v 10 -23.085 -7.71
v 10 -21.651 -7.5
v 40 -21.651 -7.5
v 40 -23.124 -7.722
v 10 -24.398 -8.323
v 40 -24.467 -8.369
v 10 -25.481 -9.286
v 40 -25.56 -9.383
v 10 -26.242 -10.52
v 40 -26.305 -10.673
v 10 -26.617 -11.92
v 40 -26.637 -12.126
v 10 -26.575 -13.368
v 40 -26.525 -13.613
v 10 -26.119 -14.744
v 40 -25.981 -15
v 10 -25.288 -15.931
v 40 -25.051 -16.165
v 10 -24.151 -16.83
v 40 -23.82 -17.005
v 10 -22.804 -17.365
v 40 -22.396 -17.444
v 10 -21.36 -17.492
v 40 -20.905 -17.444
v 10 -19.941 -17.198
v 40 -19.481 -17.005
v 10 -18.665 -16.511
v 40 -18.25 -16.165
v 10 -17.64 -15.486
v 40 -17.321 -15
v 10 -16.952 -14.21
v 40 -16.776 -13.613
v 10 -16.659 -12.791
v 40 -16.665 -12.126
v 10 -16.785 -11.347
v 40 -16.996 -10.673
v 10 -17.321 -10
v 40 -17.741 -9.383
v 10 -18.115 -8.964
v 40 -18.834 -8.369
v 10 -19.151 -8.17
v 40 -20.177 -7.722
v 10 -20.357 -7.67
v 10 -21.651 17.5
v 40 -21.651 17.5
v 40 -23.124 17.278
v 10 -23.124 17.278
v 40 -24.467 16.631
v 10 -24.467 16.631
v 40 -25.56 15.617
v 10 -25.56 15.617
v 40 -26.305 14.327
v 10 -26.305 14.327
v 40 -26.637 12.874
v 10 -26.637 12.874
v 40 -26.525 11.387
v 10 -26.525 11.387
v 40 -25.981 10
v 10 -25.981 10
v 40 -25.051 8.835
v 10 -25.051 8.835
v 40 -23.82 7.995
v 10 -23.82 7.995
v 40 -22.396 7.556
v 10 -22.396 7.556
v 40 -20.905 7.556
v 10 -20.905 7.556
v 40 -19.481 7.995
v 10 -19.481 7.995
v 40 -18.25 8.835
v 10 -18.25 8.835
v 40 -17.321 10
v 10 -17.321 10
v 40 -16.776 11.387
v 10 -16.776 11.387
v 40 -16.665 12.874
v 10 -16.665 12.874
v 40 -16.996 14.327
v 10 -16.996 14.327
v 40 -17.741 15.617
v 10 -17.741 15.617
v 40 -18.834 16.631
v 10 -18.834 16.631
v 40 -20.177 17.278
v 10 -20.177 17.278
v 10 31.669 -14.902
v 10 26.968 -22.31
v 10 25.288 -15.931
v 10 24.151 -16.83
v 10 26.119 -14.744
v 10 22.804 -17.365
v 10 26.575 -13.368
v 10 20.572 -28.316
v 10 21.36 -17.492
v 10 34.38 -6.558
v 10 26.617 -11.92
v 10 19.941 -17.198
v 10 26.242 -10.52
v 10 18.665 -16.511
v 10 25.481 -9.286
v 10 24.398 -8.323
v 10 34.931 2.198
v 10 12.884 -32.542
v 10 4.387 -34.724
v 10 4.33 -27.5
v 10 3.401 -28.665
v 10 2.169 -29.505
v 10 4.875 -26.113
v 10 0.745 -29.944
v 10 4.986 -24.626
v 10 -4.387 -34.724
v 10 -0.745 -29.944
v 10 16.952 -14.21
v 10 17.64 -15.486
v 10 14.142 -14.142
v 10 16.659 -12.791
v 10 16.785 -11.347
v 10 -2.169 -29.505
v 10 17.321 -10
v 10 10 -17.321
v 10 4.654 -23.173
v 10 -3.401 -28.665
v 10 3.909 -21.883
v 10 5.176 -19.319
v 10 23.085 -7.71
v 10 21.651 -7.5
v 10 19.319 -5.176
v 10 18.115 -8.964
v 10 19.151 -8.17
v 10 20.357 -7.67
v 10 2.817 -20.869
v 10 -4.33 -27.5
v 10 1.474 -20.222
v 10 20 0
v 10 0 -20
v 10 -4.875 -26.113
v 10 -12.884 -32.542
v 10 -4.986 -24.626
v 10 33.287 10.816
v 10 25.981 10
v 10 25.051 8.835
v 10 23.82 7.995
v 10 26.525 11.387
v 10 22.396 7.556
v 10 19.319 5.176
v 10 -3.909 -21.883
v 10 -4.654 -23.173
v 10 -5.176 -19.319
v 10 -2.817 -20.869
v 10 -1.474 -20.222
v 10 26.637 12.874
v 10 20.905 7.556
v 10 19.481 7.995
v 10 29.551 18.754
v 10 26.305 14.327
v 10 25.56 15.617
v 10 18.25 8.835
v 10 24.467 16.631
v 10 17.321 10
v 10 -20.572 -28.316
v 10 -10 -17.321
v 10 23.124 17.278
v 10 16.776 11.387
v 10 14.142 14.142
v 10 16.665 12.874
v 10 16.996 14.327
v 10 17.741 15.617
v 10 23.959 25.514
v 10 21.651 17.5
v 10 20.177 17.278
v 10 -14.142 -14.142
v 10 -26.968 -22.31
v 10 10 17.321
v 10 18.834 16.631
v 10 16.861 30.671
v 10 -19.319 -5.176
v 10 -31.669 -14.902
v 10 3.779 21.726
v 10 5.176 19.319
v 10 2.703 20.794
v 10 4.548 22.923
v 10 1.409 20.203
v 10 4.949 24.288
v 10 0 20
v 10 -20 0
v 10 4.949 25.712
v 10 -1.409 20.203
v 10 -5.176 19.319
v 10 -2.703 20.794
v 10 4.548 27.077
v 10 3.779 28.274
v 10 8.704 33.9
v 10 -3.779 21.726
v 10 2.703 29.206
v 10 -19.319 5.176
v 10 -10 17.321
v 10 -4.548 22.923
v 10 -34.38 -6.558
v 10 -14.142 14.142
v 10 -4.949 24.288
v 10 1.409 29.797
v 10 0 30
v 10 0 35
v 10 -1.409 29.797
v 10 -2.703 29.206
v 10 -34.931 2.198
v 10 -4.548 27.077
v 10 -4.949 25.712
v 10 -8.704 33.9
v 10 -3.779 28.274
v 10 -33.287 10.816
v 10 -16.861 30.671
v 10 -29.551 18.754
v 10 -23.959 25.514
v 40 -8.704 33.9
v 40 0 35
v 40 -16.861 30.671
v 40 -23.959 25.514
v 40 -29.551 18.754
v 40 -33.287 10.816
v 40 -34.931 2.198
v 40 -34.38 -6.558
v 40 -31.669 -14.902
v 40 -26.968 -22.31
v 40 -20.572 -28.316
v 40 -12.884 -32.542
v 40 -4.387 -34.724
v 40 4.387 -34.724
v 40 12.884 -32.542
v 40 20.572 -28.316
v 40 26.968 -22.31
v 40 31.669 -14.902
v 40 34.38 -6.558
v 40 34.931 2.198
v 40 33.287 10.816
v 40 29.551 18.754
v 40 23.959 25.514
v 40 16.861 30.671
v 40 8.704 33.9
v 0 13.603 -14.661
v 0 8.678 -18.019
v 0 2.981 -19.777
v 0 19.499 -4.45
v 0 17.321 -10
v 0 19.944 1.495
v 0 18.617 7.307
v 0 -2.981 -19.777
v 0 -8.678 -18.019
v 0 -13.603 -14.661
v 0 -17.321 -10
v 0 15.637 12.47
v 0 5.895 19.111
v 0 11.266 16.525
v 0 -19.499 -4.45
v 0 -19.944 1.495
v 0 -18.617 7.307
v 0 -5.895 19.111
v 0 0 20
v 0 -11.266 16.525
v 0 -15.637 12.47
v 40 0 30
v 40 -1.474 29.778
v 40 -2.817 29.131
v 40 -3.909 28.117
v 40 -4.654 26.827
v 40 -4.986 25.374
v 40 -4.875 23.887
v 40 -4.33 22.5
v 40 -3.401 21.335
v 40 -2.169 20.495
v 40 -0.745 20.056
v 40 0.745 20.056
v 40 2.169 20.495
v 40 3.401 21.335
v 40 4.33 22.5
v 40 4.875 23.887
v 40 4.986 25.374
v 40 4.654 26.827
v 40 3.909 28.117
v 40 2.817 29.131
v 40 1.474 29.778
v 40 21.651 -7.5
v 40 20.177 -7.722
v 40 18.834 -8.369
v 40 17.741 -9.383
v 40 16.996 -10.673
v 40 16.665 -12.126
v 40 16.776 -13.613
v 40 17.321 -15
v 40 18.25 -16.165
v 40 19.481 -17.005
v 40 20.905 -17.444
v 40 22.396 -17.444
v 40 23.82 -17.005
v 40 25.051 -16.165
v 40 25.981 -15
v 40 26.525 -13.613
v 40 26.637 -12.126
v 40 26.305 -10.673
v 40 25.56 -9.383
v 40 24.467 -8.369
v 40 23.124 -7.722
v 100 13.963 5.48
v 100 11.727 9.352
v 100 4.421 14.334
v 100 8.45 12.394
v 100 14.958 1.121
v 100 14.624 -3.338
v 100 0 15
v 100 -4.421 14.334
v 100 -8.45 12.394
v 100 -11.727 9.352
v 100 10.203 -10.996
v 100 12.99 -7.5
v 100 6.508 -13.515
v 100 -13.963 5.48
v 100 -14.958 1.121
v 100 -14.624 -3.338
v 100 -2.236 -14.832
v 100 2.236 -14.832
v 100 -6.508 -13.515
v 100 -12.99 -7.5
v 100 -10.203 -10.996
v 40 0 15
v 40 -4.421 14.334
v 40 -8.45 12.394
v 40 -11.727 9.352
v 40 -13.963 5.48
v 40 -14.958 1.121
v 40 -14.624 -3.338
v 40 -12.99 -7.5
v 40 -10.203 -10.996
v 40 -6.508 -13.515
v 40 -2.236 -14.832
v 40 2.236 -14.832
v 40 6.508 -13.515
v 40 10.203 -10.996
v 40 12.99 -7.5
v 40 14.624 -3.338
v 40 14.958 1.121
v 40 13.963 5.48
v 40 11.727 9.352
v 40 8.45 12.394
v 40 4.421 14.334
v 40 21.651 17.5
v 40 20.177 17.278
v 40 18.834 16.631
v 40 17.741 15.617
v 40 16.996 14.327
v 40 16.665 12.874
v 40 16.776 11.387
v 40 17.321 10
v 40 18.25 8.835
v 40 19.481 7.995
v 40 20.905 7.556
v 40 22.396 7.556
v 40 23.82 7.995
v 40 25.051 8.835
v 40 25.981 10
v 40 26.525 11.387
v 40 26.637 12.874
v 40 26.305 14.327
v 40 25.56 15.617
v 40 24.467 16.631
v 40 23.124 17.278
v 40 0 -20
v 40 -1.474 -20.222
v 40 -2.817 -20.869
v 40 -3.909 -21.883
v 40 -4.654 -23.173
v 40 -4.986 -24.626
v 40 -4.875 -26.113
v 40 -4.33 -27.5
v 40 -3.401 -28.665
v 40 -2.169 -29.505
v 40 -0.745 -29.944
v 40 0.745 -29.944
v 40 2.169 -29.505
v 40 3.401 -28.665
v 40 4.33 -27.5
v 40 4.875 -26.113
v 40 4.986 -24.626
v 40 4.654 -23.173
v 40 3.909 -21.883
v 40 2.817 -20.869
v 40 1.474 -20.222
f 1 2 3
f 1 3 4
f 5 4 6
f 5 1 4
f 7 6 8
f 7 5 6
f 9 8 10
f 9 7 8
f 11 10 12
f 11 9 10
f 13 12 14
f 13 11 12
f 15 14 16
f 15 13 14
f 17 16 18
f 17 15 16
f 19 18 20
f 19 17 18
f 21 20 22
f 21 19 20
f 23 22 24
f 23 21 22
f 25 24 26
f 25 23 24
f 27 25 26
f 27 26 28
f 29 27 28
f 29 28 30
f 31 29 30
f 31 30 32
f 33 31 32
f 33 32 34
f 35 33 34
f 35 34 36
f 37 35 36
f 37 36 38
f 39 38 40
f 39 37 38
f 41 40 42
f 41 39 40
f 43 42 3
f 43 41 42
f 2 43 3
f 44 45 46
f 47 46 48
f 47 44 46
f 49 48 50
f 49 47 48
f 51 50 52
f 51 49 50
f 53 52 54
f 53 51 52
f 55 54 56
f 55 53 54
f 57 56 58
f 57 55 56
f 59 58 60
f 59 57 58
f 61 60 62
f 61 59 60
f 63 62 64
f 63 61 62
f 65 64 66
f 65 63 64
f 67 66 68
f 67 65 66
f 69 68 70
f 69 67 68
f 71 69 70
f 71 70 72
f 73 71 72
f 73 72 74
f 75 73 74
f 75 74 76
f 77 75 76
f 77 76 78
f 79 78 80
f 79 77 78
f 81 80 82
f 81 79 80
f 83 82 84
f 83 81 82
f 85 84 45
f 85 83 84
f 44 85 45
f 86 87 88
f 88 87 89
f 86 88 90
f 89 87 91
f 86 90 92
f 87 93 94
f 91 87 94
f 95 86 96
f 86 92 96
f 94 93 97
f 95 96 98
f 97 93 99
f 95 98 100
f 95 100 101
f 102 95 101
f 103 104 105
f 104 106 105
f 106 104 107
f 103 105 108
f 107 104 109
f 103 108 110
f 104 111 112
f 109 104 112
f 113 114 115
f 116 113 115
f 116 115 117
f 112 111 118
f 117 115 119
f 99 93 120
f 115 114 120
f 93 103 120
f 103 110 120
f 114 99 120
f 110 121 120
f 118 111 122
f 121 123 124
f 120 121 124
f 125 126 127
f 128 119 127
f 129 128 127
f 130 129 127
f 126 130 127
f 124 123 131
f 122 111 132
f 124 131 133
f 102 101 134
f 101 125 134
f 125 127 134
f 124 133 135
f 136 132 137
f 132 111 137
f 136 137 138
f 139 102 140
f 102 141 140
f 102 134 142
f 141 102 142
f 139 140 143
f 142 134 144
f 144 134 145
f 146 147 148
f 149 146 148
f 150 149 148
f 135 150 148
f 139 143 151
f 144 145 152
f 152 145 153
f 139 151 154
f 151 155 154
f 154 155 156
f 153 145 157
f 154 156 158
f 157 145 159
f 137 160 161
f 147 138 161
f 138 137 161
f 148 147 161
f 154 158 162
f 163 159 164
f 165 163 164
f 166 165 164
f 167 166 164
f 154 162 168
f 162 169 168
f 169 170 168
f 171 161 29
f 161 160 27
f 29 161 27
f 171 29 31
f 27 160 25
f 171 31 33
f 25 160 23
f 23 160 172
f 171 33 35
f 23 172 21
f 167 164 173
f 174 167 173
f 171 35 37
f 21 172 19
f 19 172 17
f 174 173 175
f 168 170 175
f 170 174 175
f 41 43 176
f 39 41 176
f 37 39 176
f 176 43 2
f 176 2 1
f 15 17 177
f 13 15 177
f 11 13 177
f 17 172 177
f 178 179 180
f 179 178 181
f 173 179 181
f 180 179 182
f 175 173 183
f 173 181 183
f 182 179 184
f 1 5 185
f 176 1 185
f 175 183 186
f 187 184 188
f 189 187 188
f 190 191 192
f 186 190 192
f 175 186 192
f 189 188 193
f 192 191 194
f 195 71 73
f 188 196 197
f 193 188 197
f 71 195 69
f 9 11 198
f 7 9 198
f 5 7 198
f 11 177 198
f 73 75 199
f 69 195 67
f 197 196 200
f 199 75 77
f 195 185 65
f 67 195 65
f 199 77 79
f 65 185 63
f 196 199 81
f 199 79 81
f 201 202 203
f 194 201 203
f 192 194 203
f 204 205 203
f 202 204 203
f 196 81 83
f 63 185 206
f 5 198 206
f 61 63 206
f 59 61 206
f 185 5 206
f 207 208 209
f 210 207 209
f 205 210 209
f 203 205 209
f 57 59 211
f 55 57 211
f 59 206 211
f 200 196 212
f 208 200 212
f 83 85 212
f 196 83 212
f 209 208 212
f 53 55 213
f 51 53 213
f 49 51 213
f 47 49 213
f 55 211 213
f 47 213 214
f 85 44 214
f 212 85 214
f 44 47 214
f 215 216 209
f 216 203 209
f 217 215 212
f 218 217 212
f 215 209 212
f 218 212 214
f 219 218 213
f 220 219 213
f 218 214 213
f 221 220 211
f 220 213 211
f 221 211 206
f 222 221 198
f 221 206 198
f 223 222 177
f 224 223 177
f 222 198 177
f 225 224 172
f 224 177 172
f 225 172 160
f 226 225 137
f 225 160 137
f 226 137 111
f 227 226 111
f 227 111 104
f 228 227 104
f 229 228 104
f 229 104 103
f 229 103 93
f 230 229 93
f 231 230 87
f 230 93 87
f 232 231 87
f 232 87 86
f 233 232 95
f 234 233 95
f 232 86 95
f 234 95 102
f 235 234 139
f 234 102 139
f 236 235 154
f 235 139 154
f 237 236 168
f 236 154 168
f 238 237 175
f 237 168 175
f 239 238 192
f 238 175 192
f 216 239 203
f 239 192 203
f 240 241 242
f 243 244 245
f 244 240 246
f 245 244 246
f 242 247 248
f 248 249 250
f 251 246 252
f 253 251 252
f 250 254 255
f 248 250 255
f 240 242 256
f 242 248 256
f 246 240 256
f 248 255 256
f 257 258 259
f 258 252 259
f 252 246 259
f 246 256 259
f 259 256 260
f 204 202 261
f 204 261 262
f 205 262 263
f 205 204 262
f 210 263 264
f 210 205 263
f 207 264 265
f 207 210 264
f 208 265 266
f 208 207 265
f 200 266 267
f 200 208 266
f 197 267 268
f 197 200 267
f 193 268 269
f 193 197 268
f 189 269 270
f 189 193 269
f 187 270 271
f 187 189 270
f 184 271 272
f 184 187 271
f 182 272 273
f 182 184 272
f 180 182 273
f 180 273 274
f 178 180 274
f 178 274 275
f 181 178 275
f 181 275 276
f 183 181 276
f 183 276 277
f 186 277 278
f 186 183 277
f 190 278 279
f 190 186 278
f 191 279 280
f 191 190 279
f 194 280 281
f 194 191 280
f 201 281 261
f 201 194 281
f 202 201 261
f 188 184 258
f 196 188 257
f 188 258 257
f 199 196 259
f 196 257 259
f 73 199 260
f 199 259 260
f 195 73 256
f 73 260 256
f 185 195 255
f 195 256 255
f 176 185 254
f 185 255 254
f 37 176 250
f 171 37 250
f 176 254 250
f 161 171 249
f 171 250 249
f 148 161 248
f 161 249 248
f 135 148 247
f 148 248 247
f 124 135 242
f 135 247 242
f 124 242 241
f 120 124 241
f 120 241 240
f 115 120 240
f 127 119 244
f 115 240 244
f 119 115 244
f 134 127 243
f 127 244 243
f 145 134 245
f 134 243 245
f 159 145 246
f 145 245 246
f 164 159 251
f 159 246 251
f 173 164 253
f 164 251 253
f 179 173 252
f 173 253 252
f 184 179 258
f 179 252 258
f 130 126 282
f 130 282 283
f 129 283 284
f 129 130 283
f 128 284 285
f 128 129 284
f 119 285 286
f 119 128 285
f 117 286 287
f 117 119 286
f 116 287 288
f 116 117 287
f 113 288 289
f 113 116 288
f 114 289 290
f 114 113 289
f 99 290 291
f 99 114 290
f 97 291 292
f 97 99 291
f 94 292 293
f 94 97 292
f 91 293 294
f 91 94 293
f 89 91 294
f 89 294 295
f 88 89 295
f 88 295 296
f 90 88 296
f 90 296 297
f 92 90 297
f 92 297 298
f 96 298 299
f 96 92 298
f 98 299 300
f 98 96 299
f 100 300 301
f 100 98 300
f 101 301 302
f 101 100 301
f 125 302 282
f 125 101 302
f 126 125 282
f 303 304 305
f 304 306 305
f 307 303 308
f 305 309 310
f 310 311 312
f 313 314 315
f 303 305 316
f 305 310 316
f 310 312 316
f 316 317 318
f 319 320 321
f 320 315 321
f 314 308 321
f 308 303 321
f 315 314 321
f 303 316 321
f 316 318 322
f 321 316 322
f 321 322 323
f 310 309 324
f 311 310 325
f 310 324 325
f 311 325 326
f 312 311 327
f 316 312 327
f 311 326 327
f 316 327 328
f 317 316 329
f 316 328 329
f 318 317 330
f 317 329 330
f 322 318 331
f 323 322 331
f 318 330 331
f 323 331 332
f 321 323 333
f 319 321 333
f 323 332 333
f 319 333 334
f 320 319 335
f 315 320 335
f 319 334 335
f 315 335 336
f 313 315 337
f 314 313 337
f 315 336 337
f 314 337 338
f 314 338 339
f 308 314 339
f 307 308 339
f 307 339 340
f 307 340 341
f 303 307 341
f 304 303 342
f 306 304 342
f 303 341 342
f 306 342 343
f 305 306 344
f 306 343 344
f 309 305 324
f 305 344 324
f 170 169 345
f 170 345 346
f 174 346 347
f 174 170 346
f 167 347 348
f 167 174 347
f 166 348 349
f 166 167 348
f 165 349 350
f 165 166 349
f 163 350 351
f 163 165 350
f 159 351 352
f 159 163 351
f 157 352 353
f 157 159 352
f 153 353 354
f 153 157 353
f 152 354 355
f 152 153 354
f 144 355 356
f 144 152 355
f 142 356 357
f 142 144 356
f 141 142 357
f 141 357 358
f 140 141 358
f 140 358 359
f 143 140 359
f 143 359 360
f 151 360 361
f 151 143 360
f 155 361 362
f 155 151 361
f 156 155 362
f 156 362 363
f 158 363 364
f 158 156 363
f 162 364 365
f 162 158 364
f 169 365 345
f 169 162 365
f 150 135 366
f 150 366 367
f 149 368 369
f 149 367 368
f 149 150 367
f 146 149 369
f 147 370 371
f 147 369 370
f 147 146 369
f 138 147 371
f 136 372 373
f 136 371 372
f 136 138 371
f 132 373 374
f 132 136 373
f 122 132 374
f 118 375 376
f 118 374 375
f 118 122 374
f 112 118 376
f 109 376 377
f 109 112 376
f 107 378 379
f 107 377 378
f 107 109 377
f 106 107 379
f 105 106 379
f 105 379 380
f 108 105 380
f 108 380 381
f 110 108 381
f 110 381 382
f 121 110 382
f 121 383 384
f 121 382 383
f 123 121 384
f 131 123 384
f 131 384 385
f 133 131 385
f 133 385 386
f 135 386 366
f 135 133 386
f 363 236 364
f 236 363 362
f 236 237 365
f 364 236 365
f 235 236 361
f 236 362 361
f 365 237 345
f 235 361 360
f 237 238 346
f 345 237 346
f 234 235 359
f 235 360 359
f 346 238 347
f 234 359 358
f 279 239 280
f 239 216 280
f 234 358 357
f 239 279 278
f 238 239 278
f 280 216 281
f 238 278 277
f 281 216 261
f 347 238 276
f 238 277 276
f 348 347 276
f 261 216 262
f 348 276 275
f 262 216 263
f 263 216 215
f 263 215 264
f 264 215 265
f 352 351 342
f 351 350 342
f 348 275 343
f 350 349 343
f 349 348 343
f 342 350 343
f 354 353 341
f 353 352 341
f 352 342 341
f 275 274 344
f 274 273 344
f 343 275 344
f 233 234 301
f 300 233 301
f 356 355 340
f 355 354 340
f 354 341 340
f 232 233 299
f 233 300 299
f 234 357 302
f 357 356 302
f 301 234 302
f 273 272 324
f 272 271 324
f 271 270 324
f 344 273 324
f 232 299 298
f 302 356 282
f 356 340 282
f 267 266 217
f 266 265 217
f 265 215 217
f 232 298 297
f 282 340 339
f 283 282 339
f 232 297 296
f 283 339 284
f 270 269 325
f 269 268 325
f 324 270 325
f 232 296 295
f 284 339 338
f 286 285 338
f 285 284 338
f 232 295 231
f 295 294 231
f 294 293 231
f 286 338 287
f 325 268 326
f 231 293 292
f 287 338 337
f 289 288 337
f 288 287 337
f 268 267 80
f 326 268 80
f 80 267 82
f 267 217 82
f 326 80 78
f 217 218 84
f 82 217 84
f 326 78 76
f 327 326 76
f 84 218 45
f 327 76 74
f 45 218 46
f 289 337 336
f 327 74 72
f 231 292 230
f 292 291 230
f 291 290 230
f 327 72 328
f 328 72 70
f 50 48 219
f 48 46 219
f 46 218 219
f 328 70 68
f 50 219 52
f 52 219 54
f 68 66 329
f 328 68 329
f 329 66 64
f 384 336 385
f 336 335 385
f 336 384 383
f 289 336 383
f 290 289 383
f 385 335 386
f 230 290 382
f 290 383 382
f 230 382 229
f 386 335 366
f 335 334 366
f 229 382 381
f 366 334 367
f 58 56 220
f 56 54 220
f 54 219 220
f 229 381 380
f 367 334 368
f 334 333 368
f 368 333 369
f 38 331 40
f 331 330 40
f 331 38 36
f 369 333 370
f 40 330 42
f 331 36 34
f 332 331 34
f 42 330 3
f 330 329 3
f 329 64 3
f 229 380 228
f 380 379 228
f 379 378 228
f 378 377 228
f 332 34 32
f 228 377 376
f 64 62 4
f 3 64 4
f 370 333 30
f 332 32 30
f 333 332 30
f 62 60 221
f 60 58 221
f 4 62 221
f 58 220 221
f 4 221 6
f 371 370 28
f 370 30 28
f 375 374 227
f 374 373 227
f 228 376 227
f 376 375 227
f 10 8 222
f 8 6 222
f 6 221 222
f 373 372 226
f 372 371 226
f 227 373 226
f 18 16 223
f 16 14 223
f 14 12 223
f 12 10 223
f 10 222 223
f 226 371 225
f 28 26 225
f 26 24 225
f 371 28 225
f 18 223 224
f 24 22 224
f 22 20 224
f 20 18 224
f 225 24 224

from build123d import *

# Parameters (mm, degrees)
SKETCH_2_R          = 5
CUT_EXTRUDE_1_DEPTH = 112.579568022
SKETCH_3_R          = 5
CUT_EXTRUDE_2_DEPTH = 112.579568022
SKETCH_4_R          = 5
CUT_EXTRUDE_3_DEPTH = 112.579568022
SKETCH_5_R          = 5
CUT_EXTRUDE_4_DEPTH = 112.579568022
SKETCH_6_R          = 5
CUT_EXTRUDE_5_DEPTH = 112.579568022
SKETCH_7_R          = 5
CUT_EXTRUDE_6_DEPTH = 112.579568022


with BuildPart() as part:
    # Эскиз1 → Повернуть1 (revolve)
    with BuildSketch(Plane.XY, mode=Mode.PRIVATE) as revolve_1_sk:
        Polygon((0, 0), (100, 0), (100, 15), (40, 15), (40, 35), (10, 35), (10, 20), (0, 20), align=None)
    revolve(revolve_1_sk.sketch.rotate(Axis((0, 0, 0), (1, 0, 0)), 90), axis=Axis((0, 0, 0), (1, 0, 0)))

    # Эскиз2 → Вырез-Вытянуть1 (cut, through all)
    with BuildSketch(Plane(origin=(0, 0, 0), x_dir=(0, 0, -1), z_dir=(1, 0, 0))):
        with Locations(Location((25, 0, 0), (0, 0, 180))):
            Circle(SKETCH_2_R)
    extrude(amount=CUT_EXTRUDE_1_DEPTH, mode=Mode.SUBTRACT)

    # Эскиз3 → Вырез-Вытянуть2 (cut, through all)
    with BuildSketch(Plane(origin=(0, 0, 0), x_dir=(0, 0, -1), z_dir=(1, 0, 0))):
        with Locations(Location((12.5, 21.650635095, 0), (0, 0, 180))):
            Circle(SKETCH_3_R)
    extrude(amount=CUT_EXTRUDE_2_DEPTH, mode=Mode.SUBTRACT)

    # Эскиз4 → Вырез-Вытянуть3 (cut, through all)
    with BuildSketch(Plane(origin=(0, 0, 0), x_dir=(0, 0, -1), z_dir=(1, 0, 0))):
        with Locations(Location((-12.5, 21.650635095, 0), (0, 0, 180))):
            Circle(SKETCH_4_R)
    extrude(amount=CUT_EXTRUDE_3_DEPTH, mode=Mode.SUBTRACT)

    # Эскиз5 → Вырез-Вытянуть4 (cut, through all)
    with BuildSketch(Plane(origin=(0, 0, 0), x_dir=(0, 0, -1), z_dir=(1, 0, 0))):
        with Locations(Location((-25, 0, 0), (0, 0, 180))):
            Circle(SKETCH_5_R)
    extrude(amount=CUT_EXTRUDE_4_DEPTH, mode=Mode.SUBTRACT)

    # Эскиз6 → Вырез-Вытянуть5 (cut, through all)
    with BuildSketch(Plane(origin=(0, 0, 0), x_dir=(0, 0, -1), z_dir=(1, 0, 0))):
        with Locations(Location((-12.5, -21.650635095, 0), (0, 0, 180))):
            Circle(SKETCH_6_R)
    extrude(amount=CUT_EXTRUDE_5_DEPTH, mode=Mode.SUBTRACT)

    # Эскиз7 → Вырез-Вытянуть6 (cut, through all)
    with BuildSketch(Plane(origin=(0, 0, 0), x_dir=(0, 0, -1), z_dir=(1, 0, 0))):
        with Locations(Location((12.5, -21.650635095, 0), (0, 0, 180))):
            Circle(SKETCH_7_R)
    extrude(amount=CUT_EXTRUDE_6_DEPTH, mode=Mode.SUBTRACT)


solid = part.part
